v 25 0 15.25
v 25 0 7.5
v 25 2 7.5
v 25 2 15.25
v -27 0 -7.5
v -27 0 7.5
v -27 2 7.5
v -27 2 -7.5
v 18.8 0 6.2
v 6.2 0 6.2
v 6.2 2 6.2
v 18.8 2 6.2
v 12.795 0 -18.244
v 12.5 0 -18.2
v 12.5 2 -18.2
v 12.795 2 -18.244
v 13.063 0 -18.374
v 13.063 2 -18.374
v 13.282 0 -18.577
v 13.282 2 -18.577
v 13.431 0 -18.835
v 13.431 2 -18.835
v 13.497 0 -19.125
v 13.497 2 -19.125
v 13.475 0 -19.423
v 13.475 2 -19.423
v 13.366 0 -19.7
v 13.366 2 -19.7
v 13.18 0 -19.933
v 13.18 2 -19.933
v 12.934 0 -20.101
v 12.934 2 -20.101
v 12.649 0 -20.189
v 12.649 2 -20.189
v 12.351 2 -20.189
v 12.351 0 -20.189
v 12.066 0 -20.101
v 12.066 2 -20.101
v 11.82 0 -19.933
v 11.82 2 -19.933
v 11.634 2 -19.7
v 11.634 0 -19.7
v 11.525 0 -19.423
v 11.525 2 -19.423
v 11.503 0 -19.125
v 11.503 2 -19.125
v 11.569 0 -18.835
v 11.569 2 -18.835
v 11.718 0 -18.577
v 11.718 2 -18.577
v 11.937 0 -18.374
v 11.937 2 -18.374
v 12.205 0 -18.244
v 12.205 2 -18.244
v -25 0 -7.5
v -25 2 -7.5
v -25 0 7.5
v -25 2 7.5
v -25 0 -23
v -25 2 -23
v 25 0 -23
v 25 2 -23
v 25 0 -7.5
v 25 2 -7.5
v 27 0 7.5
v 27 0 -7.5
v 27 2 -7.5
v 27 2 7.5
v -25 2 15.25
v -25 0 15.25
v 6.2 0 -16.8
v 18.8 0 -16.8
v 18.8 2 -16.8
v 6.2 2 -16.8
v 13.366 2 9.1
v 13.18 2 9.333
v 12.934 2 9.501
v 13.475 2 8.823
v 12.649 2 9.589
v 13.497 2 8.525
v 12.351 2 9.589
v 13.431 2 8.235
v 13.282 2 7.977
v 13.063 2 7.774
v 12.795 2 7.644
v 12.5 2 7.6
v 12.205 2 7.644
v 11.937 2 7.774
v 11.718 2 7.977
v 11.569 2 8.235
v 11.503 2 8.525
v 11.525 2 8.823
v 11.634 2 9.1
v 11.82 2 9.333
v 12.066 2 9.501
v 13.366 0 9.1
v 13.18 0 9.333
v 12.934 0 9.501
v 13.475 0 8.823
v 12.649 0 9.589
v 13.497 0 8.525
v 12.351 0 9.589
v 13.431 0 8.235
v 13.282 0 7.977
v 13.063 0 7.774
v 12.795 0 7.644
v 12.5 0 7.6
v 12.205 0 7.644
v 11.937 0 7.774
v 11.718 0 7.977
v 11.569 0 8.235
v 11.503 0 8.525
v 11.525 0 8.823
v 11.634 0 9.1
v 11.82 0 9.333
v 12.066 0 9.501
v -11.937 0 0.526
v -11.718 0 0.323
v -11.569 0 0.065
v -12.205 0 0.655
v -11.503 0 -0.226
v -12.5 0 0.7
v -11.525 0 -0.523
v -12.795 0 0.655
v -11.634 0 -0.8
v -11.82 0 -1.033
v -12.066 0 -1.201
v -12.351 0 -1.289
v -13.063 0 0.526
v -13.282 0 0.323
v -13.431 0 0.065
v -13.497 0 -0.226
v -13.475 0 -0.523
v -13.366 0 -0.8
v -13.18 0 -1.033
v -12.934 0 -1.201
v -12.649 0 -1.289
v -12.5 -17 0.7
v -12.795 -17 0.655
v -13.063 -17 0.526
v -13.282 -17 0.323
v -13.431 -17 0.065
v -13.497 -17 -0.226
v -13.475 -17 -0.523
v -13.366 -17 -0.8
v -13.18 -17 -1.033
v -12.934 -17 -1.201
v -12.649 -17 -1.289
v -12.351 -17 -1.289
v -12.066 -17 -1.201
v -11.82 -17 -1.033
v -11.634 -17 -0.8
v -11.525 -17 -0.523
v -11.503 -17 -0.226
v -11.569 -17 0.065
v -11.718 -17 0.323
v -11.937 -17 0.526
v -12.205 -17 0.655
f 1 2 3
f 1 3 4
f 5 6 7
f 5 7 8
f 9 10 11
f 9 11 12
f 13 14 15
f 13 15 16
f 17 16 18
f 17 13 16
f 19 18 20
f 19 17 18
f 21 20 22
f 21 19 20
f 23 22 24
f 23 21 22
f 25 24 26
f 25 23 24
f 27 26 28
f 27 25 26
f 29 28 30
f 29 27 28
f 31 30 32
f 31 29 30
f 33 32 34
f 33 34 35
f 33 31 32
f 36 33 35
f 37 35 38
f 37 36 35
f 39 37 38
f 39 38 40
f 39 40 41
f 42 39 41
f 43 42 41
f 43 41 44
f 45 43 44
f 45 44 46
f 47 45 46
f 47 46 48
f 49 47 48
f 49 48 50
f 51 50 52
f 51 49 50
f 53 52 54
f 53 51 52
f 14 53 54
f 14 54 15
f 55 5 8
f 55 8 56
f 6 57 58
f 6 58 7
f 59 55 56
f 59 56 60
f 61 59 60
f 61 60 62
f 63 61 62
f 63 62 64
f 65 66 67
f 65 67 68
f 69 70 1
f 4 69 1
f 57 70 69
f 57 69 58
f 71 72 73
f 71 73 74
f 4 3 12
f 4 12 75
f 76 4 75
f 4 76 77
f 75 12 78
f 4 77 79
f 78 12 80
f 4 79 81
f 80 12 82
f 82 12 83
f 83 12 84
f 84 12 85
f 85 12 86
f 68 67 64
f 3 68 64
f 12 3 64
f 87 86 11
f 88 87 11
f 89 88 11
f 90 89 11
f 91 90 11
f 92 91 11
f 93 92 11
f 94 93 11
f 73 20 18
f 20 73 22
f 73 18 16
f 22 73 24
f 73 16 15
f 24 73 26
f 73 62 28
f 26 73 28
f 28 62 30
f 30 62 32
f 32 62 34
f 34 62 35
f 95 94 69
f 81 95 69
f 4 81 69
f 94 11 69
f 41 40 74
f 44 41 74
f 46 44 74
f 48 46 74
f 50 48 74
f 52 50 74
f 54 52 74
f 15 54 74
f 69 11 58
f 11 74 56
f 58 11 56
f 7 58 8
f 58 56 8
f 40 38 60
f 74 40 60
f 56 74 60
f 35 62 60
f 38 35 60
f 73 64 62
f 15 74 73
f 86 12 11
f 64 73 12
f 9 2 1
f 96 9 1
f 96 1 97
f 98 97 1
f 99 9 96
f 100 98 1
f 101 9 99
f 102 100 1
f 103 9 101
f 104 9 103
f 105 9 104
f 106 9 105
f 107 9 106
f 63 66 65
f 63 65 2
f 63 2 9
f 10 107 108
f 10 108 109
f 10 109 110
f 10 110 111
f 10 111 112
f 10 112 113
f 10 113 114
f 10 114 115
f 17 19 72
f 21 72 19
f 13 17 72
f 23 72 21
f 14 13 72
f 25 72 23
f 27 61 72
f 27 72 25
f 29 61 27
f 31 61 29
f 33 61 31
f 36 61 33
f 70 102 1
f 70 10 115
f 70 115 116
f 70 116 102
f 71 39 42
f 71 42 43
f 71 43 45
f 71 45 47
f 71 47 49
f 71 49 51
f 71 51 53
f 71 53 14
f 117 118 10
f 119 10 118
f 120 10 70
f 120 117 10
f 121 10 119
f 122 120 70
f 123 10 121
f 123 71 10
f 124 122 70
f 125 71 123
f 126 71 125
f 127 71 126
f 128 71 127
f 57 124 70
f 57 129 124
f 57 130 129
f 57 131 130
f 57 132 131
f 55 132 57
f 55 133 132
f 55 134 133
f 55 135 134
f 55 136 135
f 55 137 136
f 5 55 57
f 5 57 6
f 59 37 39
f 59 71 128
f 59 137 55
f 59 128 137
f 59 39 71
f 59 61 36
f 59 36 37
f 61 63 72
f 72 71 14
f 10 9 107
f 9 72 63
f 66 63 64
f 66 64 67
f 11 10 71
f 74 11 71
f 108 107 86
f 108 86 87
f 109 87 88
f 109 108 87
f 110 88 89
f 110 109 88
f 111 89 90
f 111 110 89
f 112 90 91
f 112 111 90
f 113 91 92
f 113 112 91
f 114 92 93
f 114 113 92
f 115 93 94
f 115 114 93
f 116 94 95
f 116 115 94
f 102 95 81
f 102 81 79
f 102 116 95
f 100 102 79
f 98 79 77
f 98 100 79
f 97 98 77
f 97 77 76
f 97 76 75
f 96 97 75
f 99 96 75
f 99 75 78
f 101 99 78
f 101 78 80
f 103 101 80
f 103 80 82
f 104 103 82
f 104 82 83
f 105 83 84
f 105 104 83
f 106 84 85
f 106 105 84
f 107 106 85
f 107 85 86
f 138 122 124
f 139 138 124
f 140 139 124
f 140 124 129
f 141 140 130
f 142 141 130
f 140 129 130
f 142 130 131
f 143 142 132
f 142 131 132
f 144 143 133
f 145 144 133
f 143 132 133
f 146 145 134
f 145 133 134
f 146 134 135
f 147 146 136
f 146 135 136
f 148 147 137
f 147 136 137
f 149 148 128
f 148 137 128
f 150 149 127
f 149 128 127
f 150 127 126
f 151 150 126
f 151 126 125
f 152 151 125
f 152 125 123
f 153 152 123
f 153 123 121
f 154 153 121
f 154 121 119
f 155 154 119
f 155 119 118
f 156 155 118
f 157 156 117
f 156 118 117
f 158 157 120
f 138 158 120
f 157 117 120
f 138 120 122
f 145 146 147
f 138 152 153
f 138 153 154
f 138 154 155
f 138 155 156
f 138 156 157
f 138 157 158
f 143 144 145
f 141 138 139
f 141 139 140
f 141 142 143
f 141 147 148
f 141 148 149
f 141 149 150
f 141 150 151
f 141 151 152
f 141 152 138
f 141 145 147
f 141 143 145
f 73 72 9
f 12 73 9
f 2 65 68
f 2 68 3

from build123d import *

# Parameters (mm, degrees)
SKETCH1_R           = 1
BOSS_EXTRUDE1_DEPTH = 2
SKETCH2_R           = 1
BOSS_EXTRUDE2_DEPTH = 17
SKETCH3_W           = 50
SKETCH3_H           = 7.75
CUT_EXTRUDE1_DEPTH  = 2


with BuildPart() as part:
    # Sketch1 → Boss-Extrude1 (new body)
    with BuildSketch(Plane(origin=(0, 0, 0), x_dir=(1, 0, 0), z_dir=(0, 1, 0))):
        Polygon((-25, 23), (25, 23), (25, 7.5), (27, 7.5), (27, -7.5), (25, -7.5), (25, -23), (-25, -23), (-25, -7.5), (-27, -7.5), (-27, 7.5), (-25, 7.5), align=None)
        with Locations(Location((12.5, 19.2, 0), (0, 0, 270))):
            Circle(SKETCH1_R, mode=Mode.SUBTRACT)
        with Locations(Location((12.5, -8.6, 0), (0, 0, 90))):
            Circle(SKETCH1_R, mode=Mode.SUBTRACT)
        Polygon((6.2, 16.8), (6.2, 6.2), (6.2, -6.2), (18.8, -6.2), (18.8, 6.2), (18.8, 16.8), align=None, mode=Mode.SUBTRACT)
    extrude(amount=BOSS_EXTRUDE1_DEPTH)

    # Sketch2 → Boss-Extrude2 (add)
    with BuildSketch(Plane.XZ):
        with Locations(Location((-12.5, -0.300349058, 0), (0, 0, 90))):
            Circle(SKETCH2_R)
    extrude(amount=BOSS_EXTRUDE2_DEPTH)

    # Sketch3 → Cut-Extrude1 (cut)
    with BuildSketch(Plane.XZ):
        with Locations((0, 19.125)):
            Rectangle(SKETCH3_W, SKETCH3_H)
    extrude(amount=-CUT_EXTRUDE1_DEPTH, mode=Mode.SUBTRACT)


solid = part.part
